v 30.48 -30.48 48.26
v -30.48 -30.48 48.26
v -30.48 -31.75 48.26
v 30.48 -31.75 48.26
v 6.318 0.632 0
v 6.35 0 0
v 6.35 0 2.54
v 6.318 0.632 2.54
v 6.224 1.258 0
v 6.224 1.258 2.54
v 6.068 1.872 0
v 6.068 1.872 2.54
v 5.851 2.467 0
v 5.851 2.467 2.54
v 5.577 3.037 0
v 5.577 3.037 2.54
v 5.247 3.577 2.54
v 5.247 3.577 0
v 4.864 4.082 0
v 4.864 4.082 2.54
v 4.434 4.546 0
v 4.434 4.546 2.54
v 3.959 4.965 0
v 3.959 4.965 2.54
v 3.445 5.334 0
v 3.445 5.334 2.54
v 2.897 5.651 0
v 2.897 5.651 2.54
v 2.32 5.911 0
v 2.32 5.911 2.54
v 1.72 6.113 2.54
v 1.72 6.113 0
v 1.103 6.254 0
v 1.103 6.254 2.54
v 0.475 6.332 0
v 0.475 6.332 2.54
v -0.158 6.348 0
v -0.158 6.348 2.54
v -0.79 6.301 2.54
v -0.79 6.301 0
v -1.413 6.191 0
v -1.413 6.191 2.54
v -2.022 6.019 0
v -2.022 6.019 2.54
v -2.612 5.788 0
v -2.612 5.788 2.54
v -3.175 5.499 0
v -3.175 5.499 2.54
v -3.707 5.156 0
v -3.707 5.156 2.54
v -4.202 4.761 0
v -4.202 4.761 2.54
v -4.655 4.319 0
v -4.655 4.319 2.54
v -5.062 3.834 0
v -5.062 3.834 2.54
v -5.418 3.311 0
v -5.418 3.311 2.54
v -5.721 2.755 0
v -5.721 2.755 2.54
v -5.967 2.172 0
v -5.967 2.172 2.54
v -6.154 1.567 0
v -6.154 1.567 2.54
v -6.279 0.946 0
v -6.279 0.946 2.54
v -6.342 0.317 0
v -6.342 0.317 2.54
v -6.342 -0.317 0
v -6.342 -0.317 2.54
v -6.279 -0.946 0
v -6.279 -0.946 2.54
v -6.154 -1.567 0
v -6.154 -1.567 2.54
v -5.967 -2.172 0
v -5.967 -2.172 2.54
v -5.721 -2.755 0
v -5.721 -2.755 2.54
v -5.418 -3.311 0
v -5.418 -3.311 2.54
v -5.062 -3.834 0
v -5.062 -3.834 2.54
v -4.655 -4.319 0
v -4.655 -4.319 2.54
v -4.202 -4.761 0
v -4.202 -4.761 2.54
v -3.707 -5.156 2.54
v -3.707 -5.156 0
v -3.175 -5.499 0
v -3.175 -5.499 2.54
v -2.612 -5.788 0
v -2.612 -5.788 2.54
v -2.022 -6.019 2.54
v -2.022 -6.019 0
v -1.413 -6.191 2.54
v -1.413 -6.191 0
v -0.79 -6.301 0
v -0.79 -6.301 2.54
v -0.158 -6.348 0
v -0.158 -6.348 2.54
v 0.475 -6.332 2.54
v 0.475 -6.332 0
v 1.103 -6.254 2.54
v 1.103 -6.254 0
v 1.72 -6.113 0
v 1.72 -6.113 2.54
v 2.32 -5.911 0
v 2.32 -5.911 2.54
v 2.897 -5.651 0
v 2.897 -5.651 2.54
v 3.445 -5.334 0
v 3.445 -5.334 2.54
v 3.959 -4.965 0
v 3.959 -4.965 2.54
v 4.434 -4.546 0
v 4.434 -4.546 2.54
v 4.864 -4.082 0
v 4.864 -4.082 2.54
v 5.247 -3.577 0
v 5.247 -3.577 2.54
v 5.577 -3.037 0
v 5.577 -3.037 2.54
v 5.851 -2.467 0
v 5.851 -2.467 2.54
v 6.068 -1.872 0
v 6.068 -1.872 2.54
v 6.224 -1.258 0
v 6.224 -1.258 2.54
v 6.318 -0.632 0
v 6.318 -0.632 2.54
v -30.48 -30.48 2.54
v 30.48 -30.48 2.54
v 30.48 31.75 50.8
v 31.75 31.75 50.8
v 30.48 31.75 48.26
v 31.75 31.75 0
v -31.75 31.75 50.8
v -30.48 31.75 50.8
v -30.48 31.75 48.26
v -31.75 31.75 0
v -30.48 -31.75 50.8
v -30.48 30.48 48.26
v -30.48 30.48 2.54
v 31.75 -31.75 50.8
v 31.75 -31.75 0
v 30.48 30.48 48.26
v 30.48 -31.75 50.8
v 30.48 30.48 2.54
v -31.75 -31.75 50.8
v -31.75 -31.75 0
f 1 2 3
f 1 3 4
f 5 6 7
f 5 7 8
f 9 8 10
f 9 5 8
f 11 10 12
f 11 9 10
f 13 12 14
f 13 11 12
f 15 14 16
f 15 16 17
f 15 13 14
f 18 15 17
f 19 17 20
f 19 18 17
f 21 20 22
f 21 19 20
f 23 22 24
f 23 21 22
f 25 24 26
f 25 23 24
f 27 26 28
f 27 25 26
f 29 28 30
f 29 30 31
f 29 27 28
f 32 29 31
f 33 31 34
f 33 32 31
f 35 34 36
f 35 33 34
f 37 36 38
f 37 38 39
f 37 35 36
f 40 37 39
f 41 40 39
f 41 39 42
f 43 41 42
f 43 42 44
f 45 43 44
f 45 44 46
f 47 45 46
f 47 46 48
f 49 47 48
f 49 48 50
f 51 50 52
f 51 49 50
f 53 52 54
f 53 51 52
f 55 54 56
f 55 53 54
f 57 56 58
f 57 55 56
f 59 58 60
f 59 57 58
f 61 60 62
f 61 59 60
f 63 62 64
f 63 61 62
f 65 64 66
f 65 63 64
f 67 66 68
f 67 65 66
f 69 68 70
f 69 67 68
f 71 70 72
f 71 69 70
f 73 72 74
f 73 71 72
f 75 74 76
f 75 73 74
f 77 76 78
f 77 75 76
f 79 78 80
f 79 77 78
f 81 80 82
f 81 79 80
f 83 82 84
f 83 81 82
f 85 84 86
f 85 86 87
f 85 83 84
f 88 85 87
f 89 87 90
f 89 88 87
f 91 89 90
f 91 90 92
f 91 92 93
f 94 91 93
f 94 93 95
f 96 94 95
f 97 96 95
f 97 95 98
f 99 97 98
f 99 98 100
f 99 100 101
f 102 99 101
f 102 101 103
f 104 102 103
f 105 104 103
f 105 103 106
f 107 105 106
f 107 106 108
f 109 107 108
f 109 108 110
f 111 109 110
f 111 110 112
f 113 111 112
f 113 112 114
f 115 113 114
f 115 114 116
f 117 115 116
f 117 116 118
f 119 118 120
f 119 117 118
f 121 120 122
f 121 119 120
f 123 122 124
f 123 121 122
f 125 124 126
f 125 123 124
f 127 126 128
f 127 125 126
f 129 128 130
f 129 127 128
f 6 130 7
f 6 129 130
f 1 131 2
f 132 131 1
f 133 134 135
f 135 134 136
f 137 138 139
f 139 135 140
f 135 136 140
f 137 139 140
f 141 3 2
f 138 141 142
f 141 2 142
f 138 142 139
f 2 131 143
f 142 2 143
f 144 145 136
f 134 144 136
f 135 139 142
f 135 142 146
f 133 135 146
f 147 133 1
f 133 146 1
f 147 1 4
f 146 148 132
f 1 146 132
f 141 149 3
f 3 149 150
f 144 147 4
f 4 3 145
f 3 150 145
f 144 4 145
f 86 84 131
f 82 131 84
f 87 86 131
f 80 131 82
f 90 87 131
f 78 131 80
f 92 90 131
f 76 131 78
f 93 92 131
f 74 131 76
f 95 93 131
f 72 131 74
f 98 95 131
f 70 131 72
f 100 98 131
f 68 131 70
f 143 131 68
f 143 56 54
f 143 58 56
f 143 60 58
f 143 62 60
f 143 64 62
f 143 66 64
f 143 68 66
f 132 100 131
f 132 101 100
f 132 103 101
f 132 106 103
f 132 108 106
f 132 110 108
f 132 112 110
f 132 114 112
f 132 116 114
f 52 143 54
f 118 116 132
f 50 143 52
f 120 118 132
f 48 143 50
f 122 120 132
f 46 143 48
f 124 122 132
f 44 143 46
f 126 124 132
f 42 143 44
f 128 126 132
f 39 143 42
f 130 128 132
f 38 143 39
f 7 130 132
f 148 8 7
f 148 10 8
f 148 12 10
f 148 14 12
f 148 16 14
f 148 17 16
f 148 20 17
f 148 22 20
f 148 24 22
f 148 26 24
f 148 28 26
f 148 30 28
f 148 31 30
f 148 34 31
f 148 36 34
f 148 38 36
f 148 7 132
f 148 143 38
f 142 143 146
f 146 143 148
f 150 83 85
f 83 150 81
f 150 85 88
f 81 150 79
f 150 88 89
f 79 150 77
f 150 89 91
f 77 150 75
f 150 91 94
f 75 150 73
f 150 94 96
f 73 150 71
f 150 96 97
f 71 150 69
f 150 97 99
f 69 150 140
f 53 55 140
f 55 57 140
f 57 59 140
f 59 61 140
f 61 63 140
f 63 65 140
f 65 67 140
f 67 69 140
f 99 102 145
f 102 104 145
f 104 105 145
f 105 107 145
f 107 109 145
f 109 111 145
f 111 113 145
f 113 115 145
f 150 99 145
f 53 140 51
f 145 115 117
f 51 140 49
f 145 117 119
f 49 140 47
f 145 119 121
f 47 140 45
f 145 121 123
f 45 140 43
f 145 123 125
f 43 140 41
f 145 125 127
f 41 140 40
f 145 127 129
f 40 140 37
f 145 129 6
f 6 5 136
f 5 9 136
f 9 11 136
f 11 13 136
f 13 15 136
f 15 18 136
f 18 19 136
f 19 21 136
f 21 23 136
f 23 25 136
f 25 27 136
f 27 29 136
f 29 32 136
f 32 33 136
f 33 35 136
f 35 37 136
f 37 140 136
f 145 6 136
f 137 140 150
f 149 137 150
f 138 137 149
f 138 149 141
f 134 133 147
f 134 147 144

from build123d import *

# Parameters (mm, degrees)
F0_W     = 60.96
F0_H     = 60.96
F0_R     = 6.35
F1_DEPTH = 2.54
F2_DEPTH = 50.8
F0_H_2   = 1.27
F3_DEPTH = 48.26


with BuildPart() as f1:
    # F0 (on Top) → F1 (new body)
    with BuildSketch(Plane.XY):
        Rectangle(F0_W, F0_H)
        Circle(F0_R, mode=Mode.SUBTRACT)
    extrude(amount=F1_DEPTH)

    # F0 (on Top) → F2 (join)
    with BuildSketch(Plane.XY):
        Polygon((-30.48, -30.48), (-30.48, 30.48), (-30.48, 31.75), (-31.75, 31.75), (-31.75, -31.75), (-30.48, -31.75), align=None)
        Polygon((30.48, 31.75), (30.48, 30.48), (30.48, -30.48), (30.48, -31.75), (31.75, -31.75), (31.75, 31.75), align=None)
    extrude(amount=F2_DEPTH)

    # F0 (on Top) → F3 (join)
    with BuildSketch(Plane.XY):
        with Locations((0, -31.115)):
            Rectangle(F0_W, F0_H_2)
        with Locations((0, 31.115)):
            Rectangle(F0_W, F0_H_2)
    extrude(amount=F3_DEPTH)


solid = f1.part
